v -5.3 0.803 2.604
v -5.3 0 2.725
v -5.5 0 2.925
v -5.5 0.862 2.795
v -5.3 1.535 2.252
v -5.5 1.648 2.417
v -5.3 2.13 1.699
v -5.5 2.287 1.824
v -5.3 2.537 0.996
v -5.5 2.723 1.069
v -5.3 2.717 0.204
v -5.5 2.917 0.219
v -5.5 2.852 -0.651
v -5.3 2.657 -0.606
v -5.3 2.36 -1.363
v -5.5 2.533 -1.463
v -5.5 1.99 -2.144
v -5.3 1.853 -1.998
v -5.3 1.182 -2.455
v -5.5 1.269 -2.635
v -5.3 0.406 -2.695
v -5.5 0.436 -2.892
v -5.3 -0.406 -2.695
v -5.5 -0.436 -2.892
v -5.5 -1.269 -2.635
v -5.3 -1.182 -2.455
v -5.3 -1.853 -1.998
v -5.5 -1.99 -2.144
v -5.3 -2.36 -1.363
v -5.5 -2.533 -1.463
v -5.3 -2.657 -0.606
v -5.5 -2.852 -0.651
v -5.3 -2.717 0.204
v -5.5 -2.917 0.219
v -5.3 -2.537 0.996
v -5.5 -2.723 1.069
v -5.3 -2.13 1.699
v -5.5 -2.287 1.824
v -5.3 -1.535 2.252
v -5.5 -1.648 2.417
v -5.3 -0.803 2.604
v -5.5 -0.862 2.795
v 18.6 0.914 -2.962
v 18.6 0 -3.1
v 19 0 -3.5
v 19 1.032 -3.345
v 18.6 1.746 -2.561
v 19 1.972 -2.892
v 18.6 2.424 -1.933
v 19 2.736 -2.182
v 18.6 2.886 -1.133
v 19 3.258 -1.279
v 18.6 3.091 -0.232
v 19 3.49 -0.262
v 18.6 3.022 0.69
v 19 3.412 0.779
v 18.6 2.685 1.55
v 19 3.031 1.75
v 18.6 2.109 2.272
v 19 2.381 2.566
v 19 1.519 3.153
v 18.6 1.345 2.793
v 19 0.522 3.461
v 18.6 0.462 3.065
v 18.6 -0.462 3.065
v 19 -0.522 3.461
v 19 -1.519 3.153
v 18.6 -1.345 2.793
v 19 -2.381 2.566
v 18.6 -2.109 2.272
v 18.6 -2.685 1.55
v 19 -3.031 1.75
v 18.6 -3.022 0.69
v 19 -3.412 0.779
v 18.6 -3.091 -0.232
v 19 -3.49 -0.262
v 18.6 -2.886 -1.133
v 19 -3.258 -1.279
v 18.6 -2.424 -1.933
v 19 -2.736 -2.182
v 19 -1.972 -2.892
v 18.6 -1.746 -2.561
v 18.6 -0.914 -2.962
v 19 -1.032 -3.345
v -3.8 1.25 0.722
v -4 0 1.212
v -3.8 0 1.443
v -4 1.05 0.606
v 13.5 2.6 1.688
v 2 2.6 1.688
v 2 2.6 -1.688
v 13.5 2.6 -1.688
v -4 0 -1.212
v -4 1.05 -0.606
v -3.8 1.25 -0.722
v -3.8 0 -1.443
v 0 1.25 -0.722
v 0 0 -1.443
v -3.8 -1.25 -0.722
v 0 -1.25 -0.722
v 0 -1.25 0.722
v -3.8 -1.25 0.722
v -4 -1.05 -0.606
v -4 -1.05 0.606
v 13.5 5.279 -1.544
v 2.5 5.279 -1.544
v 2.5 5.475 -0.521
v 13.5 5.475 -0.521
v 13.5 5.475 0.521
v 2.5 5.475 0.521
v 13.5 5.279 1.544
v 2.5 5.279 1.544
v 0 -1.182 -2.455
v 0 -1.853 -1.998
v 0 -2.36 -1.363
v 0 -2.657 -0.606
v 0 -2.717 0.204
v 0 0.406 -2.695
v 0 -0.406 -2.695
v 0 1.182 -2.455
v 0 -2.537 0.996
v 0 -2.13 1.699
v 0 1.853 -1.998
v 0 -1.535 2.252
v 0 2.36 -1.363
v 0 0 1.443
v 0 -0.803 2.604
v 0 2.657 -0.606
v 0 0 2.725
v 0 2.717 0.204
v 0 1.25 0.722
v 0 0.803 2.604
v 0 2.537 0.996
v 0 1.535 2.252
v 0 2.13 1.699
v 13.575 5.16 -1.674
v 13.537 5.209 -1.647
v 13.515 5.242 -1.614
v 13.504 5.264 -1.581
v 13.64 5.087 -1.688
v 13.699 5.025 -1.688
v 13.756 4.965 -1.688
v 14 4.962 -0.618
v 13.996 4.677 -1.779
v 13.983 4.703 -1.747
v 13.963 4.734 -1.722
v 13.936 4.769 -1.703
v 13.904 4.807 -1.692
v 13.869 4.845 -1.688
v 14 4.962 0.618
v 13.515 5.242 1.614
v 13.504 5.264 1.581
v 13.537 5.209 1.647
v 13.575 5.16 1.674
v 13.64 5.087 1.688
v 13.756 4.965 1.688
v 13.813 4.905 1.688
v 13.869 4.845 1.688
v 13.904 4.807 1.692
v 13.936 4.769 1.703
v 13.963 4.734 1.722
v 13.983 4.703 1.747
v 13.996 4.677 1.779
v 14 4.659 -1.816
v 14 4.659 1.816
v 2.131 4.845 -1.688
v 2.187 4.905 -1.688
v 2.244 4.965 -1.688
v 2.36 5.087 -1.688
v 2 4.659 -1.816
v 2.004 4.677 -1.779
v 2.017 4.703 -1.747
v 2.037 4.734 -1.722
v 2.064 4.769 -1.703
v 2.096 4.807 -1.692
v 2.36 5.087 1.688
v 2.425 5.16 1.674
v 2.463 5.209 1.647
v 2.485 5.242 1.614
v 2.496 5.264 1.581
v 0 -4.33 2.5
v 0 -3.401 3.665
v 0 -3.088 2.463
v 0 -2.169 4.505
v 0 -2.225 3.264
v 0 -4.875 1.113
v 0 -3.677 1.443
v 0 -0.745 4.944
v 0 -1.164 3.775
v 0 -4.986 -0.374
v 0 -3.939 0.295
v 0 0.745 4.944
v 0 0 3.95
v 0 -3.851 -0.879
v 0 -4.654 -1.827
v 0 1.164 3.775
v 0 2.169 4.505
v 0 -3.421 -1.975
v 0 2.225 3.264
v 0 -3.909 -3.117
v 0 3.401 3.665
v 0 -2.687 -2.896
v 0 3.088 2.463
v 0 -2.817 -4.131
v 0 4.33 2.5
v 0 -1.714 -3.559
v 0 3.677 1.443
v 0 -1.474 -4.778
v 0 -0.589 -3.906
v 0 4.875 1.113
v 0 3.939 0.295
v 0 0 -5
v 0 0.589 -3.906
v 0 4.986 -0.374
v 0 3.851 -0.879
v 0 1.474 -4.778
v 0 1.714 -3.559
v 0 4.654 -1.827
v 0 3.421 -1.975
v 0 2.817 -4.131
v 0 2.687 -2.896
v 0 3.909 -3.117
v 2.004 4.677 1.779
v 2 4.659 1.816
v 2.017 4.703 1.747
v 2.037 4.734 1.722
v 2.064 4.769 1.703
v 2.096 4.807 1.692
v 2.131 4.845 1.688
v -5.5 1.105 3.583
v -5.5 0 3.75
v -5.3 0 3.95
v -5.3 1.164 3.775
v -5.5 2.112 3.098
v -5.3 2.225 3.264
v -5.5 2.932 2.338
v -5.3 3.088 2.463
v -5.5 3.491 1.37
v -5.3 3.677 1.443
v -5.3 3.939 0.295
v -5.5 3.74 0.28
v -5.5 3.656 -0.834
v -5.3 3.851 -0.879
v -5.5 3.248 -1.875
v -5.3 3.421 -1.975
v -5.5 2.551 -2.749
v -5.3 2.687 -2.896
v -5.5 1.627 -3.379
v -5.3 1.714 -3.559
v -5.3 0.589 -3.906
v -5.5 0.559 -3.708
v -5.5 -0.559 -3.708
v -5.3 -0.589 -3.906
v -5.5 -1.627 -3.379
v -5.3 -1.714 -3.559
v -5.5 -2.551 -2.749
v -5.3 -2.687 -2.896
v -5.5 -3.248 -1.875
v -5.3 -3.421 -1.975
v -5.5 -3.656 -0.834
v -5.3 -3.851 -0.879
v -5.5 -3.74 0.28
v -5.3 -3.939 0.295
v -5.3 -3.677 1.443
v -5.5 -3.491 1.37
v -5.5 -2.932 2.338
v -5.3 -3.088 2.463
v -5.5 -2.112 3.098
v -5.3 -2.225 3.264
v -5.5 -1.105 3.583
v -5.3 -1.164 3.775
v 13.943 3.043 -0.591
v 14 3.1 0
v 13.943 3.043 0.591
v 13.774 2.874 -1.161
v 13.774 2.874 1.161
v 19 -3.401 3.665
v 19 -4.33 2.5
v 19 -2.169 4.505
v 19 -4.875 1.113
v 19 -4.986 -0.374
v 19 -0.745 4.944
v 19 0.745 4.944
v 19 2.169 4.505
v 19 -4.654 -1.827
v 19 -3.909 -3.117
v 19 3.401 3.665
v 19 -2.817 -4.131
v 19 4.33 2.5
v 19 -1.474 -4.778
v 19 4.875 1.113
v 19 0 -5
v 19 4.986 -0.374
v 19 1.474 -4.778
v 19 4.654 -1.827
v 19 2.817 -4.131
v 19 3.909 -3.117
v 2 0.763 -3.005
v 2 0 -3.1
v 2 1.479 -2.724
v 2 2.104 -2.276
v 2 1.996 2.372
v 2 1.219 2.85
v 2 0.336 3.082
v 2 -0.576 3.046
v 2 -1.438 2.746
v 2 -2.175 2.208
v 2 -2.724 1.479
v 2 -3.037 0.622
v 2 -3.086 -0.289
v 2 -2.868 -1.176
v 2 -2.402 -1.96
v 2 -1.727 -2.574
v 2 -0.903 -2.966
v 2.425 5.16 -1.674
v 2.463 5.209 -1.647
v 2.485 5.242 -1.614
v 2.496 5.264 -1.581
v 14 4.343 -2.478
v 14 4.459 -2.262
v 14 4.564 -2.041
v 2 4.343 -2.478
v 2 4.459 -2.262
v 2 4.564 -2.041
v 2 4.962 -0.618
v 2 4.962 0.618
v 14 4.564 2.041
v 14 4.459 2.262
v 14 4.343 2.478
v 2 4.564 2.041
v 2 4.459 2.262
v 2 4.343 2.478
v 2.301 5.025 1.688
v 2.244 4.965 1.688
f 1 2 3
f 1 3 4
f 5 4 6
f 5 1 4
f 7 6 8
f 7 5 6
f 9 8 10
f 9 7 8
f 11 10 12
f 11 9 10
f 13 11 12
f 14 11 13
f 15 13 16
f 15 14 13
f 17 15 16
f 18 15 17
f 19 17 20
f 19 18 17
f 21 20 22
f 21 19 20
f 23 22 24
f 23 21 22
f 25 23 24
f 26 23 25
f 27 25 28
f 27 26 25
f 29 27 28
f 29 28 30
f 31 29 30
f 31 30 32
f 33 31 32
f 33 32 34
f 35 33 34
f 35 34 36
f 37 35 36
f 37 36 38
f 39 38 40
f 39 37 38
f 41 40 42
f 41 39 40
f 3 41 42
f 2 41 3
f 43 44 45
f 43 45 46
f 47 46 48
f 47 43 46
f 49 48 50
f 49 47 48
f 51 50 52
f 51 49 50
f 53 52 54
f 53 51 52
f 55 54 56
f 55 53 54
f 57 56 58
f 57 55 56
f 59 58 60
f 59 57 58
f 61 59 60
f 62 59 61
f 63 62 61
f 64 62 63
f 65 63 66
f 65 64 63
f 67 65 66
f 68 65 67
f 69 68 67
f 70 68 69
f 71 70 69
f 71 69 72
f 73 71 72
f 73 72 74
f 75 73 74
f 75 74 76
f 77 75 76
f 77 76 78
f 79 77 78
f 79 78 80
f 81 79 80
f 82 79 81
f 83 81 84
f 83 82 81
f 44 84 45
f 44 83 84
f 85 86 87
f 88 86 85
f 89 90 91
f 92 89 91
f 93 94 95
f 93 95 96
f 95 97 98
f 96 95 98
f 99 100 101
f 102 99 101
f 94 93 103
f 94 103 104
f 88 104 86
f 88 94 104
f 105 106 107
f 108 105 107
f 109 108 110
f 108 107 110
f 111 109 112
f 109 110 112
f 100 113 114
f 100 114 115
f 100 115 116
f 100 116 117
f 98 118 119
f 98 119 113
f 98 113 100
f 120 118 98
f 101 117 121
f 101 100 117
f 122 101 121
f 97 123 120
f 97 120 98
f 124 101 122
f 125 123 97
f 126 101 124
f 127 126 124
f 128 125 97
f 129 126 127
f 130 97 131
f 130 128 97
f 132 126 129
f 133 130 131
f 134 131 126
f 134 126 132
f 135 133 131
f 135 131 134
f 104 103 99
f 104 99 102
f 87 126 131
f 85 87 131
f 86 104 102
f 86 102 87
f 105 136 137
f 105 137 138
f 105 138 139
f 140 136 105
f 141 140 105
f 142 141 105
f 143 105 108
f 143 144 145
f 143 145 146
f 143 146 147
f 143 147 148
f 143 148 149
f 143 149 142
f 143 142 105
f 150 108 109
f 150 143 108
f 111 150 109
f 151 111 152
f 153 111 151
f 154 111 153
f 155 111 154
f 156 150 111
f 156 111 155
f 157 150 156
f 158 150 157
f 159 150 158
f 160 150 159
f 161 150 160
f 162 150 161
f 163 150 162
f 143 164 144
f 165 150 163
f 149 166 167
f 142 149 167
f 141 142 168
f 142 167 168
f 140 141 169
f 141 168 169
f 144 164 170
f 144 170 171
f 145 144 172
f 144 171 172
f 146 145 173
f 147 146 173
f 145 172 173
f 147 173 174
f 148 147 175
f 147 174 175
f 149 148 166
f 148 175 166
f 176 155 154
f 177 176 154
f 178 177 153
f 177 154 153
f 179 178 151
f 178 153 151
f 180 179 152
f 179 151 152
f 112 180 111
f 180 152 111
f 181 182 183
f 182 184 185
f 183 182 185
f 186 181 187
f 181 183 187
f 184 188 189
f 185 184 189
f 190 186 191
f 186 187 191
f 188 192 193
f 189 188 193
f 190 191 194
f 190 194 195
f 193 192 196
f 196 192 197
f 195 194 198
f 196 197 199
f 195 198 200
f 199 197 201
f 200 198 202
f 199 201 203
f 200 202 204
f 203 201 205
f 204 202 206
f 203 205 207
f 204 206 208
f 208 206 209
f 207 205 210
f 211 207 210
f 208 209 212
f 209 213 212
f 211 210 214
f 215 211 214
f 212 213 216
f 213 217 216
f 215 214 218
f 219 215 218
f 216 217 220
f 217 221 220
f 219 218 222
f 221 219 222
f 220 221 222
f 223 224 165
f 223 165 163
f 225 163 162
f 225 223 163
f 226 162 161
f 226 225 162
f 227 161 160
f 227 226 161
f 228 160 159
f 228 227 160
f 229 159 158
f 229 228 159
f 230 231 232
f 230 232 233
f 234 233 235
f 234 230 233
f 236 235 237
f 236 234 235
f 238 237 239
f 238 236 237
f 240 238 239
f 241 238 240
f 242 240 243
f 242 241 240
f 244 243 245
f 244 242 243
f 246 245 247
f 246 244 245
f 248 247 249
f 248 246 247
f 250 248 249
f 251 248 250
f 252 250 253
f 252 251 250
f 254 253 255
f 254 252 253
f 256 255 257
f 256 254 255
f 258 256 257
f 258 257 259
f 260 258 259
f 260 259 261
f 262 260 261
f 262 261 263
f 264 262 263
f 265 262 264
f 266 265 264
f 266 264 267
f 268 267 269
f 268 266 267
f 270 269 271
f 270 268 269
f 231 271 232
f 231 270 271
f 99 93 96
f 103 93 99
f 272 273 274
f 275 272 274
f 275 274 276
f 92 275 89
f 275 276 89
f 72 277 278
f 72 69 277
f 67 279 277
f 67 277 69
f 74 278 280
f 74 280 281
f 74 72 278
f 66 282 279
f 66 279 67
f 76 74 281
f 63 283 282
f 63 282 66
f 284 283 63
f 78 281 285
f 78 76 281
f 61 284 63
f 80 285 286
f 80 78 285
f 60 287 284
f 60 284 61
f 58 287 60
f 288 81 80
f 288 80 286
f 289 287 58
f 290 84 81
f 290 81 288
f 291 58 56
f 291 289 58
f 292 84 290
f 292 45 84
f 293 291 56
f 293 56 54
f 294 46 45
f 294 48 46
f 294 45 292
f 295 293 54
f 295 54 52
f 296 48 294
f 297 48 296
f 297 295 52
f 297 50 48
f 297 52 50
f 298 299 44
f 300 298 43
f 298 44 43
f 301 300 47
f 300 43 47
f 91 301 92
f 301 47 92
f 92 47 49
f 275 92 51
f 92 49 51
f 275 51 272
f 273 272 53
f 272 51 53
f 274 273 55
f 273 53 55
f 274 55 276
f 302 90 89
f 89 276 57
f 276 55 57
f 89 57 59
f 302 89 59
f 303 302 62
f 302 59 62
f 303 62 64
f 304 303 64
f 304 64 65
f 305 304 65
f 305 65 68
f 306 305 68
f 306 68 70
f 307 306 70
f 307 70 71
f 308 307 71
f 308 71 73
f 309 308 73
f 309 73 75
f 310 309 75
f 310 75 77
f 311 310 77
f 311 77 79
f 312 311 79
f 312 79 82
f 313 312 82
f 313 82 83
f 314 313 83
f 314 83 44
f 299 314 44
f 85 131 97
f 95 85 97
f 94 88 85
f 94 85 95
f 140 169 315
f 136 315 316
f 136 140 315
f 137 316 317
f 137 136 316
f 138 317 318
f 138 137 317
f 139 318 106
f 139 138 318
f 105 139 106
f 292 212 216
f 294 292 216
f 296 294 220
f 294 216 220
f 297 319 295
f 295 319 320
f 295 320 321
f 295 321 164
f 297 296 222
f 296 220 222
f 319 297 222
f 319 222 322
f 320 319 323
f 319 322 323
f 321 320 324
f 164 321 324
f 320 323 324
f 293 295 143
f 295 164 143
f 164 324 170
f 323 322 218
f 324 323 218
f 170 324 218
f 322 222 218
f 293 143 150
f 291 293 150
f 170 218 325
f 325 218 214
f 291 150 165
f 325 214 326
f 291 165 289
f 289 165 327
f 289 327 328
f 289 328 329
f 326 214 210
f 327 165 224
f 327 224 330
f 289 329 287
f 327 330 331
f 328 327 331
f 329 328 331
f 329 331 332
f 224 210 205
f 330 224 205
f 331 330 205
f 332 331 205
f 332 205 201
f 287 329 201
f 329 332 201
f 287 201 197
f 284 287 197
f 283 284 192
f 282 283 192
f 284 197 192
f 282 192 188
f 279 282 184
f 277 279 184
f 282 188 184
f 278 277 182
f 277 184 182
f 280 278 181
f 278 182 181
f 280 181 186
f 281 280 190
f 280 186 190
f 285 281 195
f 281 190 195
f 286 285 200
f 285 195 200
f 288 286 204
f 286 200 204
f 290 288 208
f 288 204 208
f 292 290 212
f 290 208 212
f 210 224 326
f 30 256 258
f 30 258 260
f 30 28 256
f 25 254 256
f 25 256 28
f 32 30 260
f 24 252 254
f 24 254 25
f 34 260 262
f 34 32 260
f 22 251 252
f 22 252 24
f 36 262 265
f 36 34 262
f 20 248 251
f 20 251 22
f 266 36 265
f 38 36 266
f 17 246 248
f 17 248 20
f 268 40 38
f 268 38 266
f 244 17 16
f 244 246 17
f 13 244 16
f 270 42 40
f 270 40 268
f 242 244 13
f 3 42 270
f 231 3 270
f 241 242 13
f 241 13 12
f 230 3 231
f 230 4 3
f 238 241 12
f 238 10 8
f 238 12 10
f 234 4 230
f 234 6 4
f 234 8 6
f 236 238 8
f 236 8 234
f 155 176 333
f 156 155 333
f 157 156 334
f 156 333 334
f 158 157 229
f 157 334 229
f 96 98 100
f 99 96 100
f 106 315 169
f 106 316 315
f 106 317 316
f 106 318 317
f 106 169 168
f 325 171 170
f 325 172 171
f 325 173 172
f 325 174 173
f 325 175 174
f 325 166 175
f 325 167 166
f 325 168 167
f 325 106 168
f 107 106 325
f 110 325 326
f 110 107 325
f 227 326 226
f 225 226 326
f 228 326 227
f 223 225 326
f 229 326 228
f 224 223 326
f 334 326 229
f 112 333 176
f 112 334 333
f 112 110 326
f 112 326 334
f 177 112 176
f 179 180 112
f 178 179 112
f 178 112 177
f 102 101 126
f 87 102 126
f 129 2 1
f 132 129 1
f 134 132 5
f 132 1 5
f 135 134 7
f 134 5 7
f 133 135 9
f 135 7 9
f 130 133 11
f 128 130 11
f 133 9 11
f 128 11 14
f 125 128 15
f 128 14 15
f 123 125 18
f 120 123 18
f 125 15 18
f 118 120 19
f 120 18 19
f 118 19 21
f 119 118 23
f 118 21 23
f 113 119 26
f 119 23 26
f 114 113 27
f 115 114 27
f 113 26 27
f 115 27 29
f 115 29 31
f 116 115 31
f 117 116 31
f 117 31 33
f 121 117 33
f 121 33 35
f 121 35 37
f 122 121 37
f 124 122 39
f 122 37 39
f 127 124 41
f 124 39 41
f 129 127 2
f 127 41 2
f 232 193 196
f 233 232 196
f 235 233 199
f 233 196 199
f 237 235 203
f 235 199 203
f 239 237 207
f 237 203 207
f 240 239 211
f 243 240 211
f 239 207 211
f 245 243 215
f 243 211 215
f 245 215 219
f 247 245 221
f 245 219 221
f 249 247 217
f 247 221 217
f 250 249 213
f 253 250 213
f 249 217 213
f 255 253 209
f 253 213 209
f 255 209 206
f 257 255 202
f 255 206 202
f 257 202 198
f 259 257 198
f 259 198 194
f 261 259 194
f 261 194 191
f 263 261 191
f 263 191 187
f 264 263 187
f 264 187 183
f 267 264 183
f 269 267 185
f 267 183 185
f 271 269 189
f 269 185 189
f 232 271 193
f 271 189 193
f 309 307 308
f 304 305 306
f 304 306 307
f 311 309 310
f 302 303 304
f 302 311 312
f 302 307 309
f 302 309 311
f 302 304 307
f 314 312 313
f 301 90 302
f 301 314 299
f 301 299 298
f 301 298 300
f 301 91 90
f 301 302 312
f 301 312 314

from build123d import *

# Parameters (mm, degrees)
SKETCH_1_R          = 5
EXTRUDE_1_DEPTH     = 19
SKETCH_3_R          = 3.1
CUT_EXTRUDE_1_DEPTH = 17
EXTRUDE_2_DEPTH     = 12
SKETCH_8_R          = 3.95
EXTRUDE_4_DEPTH     = 5.5
SKETCH_9_R          = 2.725
CUT_EXTRUDE_2_DEPTH = 5.5
EXTRUDE_5_DEPTH     = 4
FILLET_1_R          = 0.2
CHAMFER_1_SIZE      = 0.5
CHAMFER_2_SIZE      = 0.4
CHAMFER_3_SIZE      = 0.2


with BuildPart() as part:
    # 草图1 → 凸台-拉伸1 (new body)
    with BuildSketch(Plane(origin=(0, 0, 0), x_dir=(0, 0, -1), z_dir=(1, 0, 0))):
        Circle(SKETCH_1_R)
    extrude(amount=EXTRUDE_1_DEPTH)

    # 草图3 → 切除-拉伸1 (cut)
    with BuildSketch(Plane(origin=(19, 0, 0), x_dir=(0, 0, -1), z_dir=(1, 0, 0))):
        Circle(SKETCH_3_R)
    extrude(amount=-CUT_EXTRUDE_1_DEPTH, mode=Mode.SUBTRACT)

    # 草图5 → 凸台-拉伸2 (add)
    with BuildSketch(Plane(origin=(2, 0, 0), x_dir=(0, 0, -1), z_dir=(1, 0, 0))):
        with BuildLine():
            Line((-1.688194302, 2.6), (1.688194302, 2.6))
            Line((1.688194302, 2.6), (1.688194302, 5.234500931))
            ThreePointArc((1.688194302, 5.234500931), (0, 5.5), (-1.688194302, 5.234500931))
            Line((-1.688194302, 5.234500931), (-1.688194302, 2.6))
        make_face()
    extrude(amount=EXTRUDE_2_DEPTH)

    # 草图8 → 凸台-拉伸4 (add)
    with BuildSketch(Plane.ZY):
        Circle(SKETCH_8_R)
    extrude(amount=EXTRUDE_4_DEPTH)

    # 草图9 → 切除-拉伸2 (cut)
    with BuildSketch(Plane.ZY.offset(5.5)):
        Circle(SKETCH_9_R)
    extrude(amount=-CUT_EXTRUDE_2_DEPTH, mode=Mode.SUBTRACT)

    # 草图10 → 凸台-拉伸5 (add)
    with BuildSketch(Plane.ZY):
        Polygon((0.721687836, 1.25), (-0.721687836, 1.25), (-1.443375673, 0), (-0.721687836, -1.25), (0.721687836, -1.25), (1.443375673, 0), align=None)
    extrude(amount=EXTRUDE_5_DEPTH)

    # 圆角1
    fillet_1_edges = [part.edges().sort_by_distance(p)[0] for p in [
        (8, 4.70637865, 1.688194302),
        (8, 5.234500931, 1.688194302),
        (8, 4.70637865, -1.688194302),
        (8, 5.234500931, -1.688194302),
    ]]
    fillet(fillet_1_edges, radius=FILLET_1_R)

    # 倒角1
    # the kernel refuses this chamfer: 0.5 mm, written as the material it takes off along each edge
    with BuildSketch(Plane(origin=(14, 0, 0), x_dir=(0, 0.8686030413593419, -0.4955085837211114), z_dir=(0, -0.4955085837211114, -0.8686030413593419))) as chamfer_1_piece_1:
        Polygon((5.5, -CHAMFER_1_SIZE), (5.5 - CHAMFER_1_SIZE, 0), (5.5, 0), align=None)
    revolve(axis=Axis((14, 0, 0), (1, 0, 0)), revolution_arc=59.40658503, mode=Mode.SUBTRACT)
    with BuildSketch(Plane(origin=(2, 0, 0), x_dir=(0, 0.8686030413593415, -0.4955085837211117), z_dir=(0, -0.4955085837211117, -0.8686030413593415))) as chamfer_1_piece_2:
        Polygon((5.5 - CHAMFER_1_SIZE, 0), (5.5, CHAMFER_1_SIZE), (5.5, 0), align=None)
    revolve(axis=Axis((2, 0, 0), (1, 0, 0)), revolution_arc=59.40658503, mode=Mode.SUBTRACT)
    with BuildSketch(Plane(origin=(14, 2.6, 2.974035796), x_dir=(0.027495876610585623, 0.9996219169112968, 0), z_dir=(0, 0, -1))) as chamfer_1_piece_3_section:
        Polygon((CHAMFER_1_SIZE * 0.999621916911, -CHAMFER_1_SIZE * 0.0274958766106), (-CHAMFER_1_SIZE * 0.0274958766106, -CHAMFER_1_SIZE * 0.999621916911), (0, 0), align=None)
    chamfer_1_piece_3 = extrude(amount=5.948071591, mode=Mode.PRIVATE)
    chamfer_1_piece_3 = chamfer_1_piece_3 & Plane(origin=(13.821912141, 0, 0), x_dir=(0, 0, -1), z_dir=(1, 0, 0)) * Cylinder(3.1, 14, mode=Mode.PRIVATE)
    add(chamfer_1_piece_3, mode=Mode.SUBTRACT)

    # 倒角2
    chamfer_2_edges = [part.edges().sort_by_distance(p)[0] for p in [
        (19, 0, 3.1),
    ]]
    chamfer(chamfer_2_edges, length=CHAMFER_2_SIZE)

    # 倒角3
    chamfer_3_edges = [part.edges().sort_by_distance(p)[0] for p in [
        (-5.5, 0, -3.95),
        (-5.5, 0, -2.725),
        (-4, 0.625, 1.082531755),
        (-4, 1.25, 0),
        (-4, 0.625, -1.082531755),
        (-4, -0.625, -1.082531755),
        (-4, -1.25, 0),
        (-4, -0.625, 1.082531755),
    ]]
    chamfer(chamfer_3_edges, length=CHAMFER_3_SIZE)


solid = part.part
